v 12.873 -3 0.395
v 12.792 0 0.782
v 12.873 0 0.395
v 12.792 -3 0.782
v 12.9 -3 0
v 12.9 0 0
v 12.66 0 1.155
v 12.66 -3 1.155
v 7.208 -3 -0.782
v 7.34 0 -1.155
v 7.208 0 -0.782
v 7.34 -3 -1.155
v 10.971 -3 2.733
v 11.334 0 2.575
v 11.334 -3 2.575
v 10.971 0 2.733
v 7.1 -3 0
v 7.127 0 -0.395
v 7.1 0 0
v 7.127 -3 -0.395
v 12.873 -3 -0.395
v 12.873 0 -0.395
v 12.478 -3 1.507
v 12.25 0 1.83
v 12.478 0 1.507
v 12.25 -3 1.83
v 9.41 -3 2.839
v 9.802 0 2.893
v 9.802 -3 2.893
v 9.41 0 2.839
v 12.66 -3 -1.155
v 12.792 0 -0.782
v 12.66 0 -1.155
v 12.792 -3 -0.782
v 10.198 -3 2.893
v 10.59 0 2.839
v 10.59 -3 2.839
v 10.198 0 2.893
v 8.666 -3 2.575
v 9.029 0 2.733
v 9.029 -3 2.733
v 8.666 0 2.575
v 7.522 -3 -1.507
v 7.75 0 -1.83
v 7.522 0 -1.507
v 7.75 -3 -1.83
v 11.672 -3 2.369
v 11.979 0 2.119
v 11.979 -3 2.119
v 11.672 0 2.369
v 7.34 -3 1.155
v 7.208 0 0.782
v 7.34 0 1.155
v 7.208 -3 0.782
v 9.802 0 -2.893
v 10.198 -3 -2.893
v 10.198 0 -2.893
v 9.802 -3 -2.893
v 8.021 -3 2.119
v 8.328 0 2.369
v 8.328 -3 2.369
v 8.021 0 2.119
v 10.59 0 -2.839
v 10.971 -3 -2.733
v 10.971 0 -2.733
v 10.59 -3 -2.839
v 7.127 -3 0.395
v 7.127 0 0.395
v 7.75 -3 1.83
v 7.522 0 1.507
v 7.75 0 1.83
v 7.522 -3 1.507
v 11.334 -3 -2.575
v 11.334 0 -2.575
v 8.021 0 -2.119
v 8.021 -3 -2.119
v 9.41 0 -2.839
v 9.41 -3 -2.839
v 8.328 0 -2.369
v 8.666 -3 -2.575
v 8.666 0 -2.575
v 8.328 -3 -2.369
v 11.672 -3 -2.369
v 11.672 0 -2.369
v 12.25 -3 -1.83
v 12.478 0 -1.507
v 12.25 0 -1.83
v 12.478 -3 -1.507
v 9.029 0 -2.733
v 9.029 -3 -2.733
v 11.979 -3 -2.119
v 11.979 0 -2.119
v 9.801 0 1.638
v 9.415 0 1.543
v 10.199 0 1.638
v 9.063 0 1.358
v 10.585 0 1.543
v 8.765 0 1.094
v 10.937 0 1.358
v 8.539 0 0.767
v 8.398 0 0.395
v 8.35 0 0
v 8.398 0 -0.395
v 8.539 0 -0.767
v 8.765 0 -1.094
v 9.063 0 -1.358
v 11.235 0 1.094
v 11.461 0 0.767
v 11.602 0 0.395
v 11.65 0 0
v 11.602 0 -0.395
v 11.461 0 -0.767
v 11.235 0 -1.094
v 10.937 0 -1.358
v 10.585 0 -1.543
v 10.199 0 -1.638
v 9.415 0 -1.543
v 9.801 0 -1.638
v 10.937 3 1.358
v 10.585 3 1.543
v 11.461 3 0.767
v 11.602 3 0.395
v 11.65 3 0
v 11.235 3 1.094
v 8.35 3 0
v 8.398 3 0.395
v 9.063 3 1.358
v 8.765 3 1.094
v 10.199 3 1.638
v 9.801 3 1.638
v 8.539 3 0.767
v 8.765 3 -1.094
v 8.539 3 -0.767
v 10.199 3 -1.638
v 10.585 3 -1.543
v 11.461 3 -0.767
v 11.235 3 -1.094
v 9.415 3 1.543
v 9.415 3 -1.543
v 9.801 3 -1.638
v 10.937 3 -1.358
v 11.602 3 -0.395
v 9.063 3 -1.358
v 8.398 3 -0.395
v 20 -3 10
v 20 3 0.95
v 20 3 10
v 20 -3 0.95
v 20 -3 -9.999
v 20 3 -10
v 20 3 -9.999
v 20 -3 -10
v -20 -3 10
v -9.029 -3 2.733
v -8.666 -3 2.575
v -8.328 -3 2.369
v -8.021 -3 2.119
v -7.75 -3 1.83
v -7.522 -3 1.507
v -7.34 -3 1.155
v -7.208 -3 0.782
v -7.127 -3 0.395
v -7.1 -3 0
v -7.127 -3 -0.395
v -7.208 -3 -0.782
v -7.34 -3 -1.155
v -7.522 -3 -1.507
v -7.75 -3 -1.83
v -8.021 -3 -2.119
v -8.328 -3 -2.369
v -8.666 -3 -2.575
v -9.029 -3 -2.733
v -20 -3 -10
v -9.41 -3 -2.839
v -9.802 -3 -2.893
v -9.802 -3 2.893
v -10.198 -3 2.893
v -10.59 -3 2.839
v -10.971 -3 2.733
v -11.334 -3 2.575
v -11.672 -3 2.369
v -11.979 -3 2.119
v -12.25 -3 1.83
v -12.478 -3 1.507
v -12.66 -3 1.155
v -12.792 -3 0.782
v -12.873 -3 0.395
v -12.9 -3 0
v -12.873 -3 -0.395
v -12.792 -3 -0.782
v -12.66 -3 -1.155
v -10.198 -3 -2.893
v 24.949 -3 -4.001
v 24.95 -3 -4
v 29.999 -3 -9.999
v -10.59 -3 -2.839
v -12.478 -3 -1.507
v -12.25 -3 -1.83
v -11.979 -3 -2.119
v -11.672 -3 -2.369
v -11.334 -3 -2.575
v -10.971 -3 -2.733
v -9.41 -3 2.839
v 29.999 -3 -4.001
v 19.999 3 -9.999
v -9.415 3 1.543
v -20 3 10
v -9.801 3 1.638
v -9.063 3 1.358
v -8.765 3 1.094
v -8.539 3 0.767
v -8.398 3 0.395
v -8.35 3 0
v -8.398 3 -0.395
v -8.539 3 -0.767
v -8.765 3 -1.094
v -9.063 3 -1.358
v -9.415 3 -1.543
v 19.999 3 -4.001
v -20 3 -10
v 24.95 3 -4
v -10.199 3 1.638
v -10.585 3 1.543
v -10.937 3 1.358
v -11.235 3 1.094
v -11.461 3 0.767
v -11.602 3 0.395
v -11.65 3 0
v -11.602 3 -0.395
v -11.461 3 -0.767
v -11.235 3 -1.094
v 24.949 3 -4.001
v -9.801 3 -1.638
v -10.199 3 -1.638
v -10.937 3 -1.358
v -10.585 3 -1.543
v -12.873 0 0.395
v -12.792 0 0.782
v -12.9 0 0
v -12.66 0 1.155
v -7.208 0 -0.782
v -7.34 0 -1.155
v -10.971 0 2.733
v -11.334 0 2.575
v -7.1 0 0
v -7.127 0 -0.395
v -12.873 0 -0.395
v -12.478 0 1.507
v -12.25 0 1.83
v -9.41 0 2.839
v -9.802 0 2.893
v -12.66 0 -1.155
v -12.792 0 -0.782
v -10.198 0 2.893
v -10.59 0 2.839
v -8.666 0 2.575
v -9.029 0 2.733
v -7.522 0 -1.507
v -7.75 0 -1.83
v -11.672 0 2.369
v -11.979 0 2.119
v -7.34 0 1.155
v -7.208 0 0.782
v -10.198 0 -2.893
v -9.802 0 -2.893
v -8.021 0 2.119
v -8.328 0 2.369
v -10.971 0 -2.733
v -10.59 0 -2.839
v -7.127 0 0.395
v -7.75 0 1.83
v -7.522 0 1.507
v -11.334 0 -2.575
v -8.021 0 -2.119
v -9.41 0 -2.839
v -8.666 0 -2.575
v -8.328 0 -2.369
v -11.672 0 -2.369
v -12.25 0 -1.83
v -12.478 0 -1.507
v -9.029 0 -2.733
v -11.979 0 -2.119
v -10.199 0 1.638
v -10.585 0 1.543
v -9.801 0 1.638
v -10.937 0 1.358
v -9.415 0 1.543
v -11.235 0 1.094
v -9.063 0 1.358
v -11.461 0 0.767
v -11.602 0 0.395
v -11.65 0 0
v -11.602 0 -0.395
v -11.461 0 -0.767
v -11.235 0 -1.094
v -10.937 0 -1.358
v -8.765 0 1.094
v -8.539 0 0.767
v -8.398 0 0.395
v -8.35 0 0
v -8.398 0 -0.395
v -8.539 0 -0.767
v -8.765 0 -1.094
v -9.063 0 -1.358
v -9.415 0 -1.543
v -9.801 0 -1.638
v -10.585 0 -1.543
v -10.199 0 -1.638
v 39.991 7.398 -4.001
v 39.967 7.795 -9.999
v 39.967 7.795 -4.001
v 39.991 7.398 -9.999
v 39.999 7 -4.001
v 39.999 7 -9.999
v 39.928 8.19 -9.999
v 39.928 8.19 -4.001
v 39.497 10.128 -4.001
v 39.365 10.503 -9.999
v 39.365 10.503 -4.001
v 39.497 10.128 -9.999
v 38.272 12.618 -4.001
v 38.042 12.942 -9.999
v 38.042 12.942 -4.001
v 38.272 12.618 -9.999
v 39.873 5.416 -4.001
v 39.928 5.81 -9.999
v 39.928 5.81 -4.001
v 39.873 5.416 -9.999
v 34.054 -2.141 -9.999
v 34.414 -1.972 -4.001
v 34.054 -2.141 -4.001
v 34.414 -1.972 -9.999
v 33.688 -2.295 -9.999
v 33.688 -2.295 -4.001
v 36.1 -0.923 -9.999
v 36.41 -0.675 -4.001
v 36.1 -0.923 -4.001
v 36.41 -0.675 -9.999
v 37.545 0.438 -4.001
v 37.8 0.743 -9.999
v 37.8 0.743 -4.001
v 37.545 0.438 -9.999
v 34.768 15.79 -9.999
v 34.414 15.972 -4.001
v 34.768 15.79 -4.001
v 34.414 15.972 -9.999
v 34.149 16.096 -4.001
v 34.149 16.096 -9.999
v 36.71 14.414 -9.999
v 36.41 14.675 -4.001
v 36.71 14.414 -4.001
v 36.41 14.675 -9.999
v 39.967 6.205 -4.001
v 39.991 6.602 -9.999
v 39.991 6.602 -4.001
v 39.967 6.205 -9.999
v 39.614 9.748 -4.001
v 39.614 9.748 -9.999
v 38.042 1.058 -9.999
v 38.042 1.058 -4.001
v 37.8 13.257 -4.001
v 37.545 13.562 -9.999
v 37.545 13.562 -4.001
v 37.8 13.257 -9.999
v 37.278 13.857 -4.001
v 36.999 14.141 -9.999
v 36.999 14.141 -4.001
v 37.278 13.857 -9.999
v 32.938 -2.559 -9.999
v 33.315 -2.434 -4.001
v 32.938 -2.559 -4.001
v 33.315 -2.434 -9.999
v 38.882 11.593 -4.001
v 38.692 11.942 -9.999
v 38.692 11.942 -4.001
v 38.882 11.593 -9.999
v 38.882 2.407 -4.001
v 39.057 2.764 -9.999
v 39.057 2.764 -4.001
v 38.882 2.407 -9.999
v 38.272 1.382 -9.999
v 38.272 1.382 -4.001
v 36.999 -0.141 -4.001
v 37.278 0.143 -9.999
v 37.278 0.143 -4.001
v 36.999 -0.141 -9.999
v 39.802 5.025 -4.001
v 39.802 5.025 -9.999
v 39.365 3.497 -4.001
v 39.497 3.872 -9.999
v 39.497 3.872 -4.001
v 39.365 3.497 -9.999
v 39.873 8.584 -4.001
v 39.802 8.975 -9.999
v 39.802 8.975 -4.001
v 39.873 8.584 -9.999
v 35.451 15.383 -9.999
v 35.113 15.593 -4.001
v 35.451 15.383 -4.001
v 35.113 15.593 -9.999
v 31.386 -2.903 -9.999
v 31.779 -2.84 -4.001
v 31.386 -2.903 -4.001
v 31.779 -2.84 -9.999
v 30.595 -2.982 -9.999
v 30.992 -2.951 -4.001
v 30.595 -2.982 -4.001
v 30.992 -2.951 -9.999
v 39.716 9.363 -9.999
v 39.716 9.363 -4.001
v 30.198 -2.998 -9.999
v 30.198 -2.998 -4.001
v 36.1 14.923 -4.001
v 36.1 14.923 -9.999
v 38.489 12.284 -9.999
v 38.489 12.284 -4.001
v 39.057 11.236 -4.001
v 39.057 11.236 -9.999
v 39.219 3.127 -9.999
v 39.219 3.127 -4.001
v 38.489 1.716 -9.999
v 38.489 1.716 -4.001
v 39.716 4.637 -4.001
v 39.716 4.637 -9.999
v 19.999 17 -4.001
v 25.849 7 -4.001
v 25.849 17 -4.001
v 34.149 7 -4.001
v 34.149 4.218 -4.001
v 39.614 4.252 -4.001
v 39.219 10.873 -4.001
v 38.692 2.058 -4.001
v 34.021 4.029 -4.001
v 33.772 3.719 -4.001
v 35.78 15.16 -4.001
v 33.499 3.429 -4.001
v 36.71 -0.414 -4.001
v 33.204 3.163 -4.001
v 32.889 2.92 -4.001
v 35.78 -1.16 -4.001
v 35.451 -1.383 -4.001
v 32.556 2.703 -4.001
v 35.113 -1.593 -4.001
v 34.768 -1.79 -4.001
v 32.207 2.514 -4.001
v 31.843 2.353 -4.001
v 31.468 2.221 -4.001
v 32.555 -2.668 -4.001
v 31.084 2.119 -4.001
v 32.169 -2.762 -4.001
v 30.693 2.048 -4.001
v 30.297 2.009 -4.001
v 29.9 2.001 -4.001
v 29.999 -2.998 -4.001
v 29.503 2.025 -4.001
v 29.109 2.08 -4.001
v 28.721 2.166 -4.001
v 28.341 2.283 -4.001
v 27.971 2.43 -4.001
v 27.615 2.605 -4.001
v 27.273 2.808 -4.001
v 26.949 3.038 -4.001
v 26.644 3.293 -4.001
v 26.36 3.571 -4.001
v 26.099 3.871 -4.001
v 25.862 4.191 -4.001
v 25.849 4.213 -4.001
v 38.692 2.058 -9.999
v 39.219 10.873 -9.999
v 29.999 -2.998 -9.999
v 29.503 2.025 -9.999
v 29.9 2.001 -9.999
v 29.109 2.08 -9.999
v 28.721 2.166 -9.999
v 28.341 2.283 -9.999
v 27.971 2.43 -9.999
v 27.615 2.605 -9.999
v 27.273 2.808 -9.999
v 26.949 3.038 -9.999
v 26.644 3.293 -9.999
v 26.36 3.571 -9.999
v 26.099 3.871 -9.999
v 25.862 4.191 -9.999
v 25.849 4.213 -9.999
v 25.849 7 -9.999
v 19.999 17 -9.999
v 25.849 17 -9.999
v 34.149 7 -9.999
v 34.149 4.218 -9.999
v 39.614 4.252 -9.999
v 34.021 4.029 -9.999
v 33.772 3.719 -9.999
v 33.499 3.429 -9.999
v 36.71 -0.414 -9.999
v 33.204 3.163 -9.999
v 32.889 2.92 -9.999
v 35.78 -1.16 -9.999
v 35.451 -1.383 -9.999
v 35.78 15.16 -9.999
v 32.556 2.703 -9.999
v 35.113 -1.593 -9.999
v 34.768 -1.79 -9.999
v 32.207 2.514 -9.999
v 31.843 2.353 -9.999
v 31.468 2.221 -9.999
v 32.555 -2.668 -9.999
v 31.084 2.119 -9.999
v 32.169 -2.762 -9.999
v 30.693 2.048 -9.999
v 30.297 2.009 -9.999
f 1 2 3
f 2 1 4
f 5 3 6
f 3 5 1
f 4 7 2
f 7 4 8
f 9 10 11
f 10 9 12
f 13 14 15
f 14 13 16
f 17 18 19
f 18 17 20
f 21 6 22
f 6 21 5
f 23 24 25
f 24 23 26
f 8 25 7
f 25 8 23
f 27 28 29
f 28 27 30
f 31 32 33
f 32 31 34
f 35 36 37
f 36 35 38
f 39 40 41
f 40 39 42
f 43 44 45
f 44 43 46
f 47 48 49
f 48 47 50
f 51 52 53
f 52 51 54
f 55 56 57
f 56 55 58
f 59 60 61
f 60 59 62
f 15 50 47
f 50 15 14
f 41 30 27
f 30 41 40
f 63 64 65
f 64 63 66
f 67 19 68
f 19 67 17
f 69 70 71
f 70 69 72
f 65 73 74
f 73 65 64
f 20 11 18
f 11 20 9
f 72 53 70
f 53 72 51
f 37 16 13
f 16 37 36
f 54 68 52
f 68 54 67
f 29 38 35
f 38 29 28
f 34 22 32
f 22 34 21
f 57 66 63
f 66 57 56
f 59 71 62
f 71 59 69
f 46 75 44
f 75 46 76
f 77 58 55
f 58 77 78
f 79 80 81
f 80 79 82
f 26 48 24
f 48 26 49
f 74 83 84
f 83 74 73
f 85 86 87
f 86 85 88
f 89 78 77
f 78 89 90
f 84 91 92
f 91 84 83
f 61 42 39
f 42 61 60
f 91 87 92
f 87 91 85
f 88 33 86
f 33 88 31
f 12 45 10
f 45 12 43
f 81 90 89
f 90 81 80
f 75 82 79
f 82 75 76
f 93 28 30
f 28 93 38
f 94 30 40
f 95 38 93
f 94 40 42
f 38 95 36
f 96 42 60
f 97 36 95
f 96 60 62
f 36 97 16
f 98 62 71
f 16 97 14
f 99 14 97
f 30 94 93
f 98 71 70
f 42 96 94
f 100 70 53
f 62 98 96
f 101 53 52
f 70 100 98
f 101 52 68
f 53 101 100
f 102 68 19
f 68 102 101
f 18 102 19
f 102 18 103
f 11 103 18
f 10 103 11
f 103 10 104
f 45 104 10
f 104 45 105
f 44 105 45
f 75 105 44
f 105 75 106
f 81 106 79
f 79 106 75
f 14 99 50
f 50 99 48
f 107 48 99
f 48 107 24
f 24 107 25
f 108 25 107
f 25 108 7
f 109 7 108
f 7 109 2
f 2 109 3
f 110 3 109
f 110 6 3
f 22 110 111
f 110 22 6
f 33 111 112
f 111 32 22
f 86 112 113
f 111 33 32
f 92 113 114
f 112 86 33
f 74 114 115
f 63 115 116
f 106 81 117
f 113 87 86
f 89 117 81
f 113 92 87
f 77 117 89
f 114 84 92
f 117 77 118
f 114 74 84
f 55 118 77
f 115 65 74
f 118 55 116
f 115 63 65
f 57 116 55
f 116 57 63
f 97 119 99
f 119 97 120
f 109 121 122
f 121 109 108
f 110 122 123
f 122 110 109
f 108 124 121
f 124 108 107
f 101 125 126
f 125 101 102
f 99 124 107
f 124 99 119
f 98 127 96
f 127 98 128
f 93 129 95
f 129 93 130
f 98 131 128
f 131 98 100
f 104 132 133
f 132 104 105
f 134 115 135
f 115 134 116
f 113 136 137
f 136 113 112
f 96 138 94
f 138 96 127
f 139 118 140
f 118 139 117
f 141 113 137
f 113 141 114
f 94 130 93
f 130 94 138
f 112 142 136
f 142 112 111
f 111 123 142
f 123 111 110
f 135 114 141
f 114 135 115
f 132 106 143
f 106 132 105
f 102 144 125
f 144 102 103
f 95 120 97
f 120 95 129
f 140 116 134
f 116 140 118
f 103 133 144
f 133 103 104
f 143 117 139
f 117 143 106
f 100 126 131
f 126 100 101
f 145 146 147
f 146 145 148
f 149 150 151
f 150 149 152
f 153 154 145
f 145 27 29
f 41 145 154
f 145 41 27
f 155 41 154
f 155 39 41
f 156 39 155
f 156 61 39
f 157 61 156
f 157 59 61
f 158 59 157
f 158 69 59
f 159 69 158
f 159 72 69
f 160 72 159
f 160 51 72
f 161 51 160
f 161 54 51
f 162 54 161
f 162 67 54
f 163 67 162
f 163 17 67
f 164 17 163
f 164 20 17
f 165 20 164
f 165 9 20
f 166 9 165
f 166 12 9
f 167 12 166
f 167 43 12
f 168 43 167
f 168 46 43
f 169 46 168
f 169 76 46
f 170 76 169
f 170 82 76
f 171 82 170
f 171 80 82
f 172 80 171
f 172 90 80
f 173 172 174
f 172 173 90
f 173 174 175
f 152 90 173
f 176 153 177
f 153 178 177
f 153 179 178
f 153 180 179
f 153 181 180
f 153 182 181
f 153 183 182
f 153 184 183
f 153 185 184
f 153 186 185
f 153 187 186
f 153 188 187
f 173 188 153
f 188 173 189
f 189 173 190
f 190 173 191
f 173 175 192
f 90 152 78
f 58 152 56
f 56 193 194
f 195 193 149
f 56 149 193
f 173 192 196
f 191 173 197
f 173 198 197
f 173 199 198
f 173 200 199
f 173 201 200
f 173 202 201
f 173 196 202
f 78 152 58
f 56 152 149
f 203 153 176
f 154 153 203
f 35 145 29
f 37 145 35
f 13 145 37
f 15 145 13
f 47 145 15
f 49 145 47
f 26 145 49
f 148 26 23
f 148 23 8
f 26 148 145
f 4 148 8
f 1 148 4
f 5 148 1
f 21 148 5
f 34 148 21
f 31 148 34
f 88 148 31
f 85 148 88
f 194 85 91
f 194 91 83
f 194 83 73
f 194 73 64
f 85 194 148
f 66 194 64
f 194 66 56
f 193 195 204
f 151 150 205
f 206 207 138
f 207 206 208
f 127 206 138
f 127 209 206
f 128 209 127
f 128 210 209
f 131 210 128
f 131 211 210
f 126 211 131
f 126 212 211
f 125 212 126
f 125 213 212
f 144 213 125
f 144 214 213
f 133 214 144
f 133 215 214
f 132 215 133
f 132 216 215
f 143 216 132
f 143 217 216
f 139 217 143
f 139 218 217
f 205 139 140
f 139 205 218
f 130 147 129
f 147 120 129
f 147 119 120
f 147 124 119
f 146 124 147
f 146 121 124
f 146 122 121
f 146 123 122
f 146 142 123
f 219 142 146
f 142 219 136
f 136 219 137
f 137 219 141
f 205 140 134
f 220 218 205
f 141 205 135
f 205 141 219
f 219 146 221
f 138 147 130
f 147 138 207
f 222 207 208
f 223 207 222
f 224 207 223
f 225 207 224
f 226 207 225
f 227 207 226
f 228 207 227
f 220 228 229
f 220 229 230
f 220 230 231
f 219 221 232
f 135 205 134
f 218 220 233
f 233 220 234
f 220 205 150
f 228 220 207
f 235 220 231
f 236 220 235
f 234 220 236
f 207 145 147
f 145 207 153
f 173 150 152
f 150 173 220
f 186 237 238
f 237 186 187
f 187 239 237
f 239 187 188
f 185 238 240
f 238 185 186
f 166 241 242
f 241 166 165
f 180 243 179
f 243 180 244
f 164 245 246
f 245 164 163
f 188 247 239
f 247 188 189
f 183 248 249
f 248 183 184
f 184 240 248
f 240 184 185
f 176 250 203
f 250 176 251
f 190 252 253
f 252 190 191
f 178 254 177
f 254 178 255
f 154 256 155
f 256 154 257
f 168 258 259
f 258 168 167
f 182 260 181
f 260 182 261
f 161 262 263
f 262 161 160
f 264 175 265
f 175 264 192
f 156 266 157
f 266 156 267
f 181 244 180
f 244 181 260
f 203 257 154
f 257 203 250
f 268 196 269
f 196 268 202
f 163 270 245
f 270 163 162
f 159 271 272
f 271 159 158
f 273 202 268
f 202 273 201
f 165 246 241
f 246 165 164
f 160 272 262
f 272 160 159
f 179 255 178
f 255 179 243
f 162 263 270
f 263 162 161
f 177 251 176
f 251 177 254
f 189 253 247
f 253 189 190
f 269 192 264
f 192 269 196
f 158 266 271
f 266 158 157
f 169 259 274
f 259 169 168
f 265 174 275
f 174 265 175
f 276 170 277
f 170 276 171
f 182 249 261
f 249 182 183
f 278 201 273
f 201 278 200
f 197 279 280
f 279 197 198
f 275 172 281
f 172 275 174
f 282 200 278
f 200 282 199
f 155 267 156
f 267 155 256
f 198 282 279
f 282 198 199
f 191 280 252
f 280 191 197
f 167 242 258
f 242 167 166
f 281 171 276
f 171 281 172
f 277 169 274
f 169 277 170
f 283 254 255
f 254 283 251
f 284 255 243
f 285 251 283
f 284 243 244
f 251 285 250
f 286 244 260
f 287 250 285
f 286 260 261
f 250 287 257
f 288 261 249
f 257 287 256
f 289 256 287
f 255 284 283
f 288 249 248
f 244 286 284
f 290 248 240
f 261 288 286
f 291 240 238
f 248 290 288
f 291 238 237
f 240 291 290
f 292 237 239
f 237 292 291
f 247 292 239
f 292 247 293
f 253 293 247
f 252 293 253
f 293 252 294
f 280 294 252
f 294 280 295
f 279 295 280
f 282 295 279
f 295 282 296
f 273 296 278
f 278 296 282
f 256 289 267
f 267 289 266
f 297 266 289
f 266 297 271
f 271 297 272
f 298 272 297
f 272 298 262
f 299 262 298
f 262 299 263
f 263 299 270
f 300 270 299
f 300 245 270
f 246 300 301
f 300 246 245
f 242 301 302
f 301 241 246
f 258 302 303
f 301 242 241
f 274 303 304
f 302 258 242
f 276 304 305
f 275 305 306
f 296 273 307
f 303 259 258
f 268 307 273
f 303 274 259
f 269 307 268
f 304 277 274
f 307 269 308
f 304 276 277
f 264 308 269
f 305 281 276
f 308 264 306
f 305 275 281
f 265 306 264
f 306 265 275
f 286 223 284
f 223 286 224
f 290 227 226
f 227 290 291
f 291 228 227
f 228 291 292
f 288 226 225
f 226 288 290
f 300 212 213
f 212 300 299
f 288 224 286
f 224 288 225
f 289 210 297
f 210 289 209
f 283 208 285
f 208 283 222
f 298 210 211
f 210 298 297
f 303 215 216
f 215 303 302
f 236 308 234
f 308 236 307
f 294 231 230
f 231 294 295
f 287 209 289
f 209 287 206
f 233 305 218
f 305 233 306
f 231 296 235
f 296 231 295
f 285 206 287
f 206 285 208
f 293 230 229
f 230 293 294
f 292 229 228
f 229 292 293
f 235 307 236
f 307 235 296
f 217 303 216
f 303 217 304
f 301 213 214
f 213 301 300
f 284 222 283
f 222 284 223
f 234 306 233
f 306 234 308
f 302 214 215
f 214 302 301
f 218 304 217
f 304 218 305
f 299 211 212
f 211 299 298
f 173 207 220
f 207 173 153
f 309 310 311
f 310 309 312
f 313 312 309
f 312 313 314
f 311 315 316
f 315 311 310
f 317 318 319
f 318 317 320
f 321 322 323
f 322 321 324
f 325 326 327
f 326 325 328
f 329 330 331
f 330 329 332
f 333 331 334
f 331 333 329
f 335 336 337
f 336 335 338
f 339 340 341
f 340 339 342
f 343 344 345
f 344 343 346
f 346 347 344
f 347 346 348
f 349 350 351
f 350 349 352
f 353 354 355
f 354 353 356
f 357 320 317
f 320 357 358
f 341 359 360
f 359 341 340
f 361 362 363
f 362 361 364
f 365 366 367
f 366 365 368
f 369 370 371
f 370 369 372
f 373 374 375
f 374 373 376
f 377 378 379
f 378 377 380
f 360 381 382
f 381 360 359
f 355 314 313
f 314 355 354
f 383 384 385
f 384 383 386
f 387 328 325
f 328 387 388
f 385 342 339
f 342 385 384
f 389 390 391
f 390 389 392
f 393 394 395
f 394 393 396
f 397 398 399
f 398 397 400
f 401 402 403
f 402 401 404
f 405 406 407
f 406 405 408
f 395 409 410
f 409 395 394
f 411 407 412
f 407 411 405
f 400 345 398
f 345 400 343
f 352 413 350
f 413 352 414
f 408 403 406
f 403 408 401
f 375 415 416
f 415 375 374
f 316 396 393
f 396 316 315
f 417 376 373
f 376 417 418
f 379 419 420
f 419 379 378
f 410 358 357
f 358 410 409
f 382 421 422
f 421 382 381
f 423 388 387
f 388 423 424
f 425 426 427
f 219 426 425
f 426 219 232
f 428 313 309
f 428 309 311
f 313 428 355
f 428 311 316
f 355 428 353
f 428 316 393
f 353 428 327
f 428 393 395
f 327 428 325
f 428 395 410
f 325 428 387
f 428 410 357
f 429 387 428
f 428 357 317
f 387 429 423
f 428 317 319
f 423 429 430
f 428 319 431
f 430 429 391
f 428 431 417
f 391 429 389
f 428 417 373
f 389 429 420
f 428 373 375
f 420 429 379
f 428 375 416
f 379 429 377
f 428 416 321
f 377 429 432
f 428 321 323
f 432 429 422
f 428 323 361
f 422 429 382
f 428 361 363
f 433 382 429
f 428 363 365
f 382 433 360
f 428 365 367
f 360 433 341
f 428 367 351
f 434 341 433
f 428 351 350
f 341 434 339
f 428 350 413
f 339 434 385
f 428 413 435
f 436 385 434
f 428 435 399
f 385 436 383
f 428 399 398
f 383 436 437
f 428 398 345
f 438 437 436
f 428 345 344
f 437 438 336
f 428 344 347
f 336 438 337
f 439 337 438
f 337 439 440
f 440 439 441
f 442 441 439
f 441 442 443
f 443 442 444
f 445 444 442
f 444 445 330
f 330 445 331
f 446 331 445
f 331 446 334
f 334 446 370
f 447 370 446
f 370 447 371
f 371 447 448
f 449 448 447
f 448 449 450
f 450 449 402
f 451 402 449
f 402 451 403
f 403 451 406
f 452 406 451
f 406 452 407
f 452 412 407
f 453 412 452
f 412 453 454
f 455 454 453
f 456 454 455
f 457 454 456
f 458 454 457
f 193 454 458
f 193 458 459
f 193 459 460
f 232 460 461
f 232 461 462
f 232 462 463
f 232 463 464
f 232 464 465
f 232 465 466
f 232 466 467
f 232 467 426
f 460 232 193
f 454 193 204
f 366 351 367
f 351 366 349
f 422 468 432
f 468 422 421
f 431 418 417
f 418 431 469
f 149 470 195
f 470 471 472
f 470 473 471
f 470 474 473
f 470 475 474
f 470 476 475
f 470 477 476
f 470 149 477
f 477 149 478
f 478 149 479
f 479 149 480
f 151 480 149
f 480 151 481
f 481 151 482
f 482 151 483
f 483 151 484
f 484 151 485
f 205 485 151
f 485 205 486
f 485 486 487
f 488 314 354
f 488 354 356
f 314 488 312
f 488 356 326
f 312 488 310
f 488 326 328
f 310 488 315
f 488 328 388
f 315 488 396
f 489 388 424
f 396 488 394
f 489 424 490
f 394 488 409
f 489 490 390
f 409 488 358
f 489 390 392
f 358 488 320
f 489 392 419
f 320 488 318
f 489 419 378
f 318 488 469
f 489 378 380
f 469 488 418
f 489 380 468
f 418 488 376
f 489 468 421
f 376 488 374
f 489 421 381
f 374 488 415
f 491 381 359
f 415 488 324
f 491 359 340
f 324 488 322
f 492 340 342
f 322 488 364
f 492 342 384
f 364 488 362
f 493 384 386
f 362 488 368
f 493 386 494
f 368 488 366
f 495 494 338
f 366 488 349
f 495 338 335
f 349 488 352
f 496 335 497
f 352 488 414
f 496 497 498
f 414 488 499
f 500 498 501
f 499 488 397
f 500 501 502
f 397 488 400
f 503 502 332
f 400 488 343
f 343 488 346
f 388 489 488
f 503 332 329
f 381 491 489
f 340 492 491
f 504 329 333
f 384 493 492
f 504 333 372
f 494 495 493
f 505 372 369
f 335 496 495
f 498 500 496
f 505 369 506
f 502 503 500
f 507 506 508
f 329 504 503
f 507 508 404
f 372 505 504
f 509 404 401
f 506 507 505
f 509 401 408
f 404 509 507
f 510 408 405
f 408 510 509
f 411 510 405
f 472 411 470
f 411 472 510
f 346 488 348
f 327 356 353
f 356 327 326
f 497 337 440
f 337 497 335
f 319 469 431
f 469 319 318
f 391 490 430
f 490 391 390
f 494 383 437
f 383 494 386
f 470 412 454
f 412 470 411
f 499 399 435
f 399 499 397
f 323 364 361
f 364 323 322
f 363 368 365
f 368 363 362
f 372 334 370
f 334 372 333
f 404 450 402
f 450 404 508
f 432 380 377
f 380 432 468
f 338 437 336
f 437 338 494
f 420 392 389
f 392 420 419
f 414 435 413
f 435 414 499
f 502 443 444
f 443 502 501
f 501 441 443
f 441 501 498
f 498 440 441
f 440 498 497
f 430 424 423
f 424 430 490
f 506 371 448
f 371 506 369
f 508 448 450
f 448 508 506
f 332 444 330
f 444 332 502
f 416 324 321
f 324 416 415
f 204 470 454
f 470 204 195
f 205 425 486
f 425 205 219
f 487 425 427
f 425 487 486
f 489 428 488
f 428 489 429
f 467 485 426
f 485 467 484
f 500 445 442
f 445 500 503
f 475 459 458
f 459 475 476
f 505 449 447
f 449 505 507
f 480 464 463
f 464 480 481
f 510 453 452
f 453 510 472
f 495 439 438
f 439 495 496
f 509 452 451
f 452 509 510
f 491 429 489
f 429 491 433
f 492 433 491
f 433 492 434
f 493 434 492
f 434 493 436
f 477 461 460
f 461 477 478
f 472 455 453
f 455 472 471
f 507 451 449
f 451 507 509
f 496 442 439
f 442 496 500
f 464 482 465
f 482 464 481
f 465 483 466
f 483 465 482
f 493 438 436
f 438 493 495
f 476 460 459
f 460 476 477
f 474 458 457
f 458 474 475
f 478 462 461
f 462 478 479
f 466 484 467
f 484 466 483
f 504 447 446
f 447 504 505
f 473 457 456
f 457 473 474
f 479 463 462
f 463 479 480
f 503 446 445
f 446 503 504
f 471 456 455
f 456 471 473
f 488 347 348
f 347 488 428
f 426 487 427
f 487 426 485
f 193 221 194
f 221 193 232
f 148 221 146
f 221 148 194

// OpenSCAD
// file: ../utils.scad
module mirror_copy(vec=[1,0,0]) {
    /*
    Same as mirror command, but makes a copy of the original.
    */
    children();
    mirror(vec) children();
}
// main file
use <../utils.scad>

$fa = 1;
$fs = 0.4;

tol = 0.001;
ptol = 0.3;

// clip plate
plate_l = 40;
plate_h = 20;
screw_diam_top = 5.5;
screw_len_top = 3;
screw_diam_bot = 3;
screw_len_bot = 3;
dist_betw_holes = 20;


module screw_hole(diam_top, depth_top, diam_bot, depth_bot) {
    /*
    Hole for mounting screws. Needs wide top and narrow bottom.
    */
    translate([0, 0, depth_bot/2])
    cylinder(h=depth_top + tol, d=diam_top, center=true);

    translate([0, 0, -depth_top/2])
    cylinder(h=depth_bot + tol, d=diam_bot, center=true);
}

plate_w = screw_len_top + screw_len_bot;

// mounting plate
rotate([90, 0, 0]) 
{
    mirror_copy([1, 0, 0])
    {
        difference()
        {
            // 1/2 plate
            translate([plate_l/4, 0, 0])
            cube([plate_l/2, plate_h, plate_w], center=true);

            // hole
            translate([dist_betw_holes/2, 0, 0])
            screw_hole(screw_diam_top+ptol, screw_len_top, screw_diam_bot+ptol, screw_len_bot);
        }
    }
}


// light mount
light_depth = 6;
light_diam = 10;
light_clamp_diam = 8 + ptol;
// side_l = 20 + plate_w;
side_l = 20;

module light_hole() {
    /*
    Round hole with flat sides to clamp the light.
    */
    difference()
    {
        cylinder(h=light_depth, r=light_diam/2, center=true);

        mirror_copy([1, 0, 0])
        {
            translate([light_clamp_diam/2 + light_diam/2, 0, 0])
            cube([light_diam, light_diam, light_depth + tol], center=true);
        }
        
    }

}

// make mount with hole
translate([plate_l/2 + side_l/2 - tol, (side_l-plate_w)/2, (light_depth-plate_h)/2])
difference()
{
    union()
    {
        cylinder(d=side_l, h=light_depth - tol, center=true);
        translate([-side_l/4, 0, 0])
        cube([side_l/2, side_l, light_depth - tol], center=true);
    }

    union()
    {
        light_hole();
        
        translate([0, light_clamp_diam, 0])
        cube([light_clamp_diam+tol, 2*light_clamp_diam, light_depth + tol], center=true);
    }
}

// chamfer
chamf = 7;
translate([plate_l/2, 0, light_depth-plate_h/2])
rotate([90, 45, 0])
cube([chamf, chamf, plate_w], center=true);
